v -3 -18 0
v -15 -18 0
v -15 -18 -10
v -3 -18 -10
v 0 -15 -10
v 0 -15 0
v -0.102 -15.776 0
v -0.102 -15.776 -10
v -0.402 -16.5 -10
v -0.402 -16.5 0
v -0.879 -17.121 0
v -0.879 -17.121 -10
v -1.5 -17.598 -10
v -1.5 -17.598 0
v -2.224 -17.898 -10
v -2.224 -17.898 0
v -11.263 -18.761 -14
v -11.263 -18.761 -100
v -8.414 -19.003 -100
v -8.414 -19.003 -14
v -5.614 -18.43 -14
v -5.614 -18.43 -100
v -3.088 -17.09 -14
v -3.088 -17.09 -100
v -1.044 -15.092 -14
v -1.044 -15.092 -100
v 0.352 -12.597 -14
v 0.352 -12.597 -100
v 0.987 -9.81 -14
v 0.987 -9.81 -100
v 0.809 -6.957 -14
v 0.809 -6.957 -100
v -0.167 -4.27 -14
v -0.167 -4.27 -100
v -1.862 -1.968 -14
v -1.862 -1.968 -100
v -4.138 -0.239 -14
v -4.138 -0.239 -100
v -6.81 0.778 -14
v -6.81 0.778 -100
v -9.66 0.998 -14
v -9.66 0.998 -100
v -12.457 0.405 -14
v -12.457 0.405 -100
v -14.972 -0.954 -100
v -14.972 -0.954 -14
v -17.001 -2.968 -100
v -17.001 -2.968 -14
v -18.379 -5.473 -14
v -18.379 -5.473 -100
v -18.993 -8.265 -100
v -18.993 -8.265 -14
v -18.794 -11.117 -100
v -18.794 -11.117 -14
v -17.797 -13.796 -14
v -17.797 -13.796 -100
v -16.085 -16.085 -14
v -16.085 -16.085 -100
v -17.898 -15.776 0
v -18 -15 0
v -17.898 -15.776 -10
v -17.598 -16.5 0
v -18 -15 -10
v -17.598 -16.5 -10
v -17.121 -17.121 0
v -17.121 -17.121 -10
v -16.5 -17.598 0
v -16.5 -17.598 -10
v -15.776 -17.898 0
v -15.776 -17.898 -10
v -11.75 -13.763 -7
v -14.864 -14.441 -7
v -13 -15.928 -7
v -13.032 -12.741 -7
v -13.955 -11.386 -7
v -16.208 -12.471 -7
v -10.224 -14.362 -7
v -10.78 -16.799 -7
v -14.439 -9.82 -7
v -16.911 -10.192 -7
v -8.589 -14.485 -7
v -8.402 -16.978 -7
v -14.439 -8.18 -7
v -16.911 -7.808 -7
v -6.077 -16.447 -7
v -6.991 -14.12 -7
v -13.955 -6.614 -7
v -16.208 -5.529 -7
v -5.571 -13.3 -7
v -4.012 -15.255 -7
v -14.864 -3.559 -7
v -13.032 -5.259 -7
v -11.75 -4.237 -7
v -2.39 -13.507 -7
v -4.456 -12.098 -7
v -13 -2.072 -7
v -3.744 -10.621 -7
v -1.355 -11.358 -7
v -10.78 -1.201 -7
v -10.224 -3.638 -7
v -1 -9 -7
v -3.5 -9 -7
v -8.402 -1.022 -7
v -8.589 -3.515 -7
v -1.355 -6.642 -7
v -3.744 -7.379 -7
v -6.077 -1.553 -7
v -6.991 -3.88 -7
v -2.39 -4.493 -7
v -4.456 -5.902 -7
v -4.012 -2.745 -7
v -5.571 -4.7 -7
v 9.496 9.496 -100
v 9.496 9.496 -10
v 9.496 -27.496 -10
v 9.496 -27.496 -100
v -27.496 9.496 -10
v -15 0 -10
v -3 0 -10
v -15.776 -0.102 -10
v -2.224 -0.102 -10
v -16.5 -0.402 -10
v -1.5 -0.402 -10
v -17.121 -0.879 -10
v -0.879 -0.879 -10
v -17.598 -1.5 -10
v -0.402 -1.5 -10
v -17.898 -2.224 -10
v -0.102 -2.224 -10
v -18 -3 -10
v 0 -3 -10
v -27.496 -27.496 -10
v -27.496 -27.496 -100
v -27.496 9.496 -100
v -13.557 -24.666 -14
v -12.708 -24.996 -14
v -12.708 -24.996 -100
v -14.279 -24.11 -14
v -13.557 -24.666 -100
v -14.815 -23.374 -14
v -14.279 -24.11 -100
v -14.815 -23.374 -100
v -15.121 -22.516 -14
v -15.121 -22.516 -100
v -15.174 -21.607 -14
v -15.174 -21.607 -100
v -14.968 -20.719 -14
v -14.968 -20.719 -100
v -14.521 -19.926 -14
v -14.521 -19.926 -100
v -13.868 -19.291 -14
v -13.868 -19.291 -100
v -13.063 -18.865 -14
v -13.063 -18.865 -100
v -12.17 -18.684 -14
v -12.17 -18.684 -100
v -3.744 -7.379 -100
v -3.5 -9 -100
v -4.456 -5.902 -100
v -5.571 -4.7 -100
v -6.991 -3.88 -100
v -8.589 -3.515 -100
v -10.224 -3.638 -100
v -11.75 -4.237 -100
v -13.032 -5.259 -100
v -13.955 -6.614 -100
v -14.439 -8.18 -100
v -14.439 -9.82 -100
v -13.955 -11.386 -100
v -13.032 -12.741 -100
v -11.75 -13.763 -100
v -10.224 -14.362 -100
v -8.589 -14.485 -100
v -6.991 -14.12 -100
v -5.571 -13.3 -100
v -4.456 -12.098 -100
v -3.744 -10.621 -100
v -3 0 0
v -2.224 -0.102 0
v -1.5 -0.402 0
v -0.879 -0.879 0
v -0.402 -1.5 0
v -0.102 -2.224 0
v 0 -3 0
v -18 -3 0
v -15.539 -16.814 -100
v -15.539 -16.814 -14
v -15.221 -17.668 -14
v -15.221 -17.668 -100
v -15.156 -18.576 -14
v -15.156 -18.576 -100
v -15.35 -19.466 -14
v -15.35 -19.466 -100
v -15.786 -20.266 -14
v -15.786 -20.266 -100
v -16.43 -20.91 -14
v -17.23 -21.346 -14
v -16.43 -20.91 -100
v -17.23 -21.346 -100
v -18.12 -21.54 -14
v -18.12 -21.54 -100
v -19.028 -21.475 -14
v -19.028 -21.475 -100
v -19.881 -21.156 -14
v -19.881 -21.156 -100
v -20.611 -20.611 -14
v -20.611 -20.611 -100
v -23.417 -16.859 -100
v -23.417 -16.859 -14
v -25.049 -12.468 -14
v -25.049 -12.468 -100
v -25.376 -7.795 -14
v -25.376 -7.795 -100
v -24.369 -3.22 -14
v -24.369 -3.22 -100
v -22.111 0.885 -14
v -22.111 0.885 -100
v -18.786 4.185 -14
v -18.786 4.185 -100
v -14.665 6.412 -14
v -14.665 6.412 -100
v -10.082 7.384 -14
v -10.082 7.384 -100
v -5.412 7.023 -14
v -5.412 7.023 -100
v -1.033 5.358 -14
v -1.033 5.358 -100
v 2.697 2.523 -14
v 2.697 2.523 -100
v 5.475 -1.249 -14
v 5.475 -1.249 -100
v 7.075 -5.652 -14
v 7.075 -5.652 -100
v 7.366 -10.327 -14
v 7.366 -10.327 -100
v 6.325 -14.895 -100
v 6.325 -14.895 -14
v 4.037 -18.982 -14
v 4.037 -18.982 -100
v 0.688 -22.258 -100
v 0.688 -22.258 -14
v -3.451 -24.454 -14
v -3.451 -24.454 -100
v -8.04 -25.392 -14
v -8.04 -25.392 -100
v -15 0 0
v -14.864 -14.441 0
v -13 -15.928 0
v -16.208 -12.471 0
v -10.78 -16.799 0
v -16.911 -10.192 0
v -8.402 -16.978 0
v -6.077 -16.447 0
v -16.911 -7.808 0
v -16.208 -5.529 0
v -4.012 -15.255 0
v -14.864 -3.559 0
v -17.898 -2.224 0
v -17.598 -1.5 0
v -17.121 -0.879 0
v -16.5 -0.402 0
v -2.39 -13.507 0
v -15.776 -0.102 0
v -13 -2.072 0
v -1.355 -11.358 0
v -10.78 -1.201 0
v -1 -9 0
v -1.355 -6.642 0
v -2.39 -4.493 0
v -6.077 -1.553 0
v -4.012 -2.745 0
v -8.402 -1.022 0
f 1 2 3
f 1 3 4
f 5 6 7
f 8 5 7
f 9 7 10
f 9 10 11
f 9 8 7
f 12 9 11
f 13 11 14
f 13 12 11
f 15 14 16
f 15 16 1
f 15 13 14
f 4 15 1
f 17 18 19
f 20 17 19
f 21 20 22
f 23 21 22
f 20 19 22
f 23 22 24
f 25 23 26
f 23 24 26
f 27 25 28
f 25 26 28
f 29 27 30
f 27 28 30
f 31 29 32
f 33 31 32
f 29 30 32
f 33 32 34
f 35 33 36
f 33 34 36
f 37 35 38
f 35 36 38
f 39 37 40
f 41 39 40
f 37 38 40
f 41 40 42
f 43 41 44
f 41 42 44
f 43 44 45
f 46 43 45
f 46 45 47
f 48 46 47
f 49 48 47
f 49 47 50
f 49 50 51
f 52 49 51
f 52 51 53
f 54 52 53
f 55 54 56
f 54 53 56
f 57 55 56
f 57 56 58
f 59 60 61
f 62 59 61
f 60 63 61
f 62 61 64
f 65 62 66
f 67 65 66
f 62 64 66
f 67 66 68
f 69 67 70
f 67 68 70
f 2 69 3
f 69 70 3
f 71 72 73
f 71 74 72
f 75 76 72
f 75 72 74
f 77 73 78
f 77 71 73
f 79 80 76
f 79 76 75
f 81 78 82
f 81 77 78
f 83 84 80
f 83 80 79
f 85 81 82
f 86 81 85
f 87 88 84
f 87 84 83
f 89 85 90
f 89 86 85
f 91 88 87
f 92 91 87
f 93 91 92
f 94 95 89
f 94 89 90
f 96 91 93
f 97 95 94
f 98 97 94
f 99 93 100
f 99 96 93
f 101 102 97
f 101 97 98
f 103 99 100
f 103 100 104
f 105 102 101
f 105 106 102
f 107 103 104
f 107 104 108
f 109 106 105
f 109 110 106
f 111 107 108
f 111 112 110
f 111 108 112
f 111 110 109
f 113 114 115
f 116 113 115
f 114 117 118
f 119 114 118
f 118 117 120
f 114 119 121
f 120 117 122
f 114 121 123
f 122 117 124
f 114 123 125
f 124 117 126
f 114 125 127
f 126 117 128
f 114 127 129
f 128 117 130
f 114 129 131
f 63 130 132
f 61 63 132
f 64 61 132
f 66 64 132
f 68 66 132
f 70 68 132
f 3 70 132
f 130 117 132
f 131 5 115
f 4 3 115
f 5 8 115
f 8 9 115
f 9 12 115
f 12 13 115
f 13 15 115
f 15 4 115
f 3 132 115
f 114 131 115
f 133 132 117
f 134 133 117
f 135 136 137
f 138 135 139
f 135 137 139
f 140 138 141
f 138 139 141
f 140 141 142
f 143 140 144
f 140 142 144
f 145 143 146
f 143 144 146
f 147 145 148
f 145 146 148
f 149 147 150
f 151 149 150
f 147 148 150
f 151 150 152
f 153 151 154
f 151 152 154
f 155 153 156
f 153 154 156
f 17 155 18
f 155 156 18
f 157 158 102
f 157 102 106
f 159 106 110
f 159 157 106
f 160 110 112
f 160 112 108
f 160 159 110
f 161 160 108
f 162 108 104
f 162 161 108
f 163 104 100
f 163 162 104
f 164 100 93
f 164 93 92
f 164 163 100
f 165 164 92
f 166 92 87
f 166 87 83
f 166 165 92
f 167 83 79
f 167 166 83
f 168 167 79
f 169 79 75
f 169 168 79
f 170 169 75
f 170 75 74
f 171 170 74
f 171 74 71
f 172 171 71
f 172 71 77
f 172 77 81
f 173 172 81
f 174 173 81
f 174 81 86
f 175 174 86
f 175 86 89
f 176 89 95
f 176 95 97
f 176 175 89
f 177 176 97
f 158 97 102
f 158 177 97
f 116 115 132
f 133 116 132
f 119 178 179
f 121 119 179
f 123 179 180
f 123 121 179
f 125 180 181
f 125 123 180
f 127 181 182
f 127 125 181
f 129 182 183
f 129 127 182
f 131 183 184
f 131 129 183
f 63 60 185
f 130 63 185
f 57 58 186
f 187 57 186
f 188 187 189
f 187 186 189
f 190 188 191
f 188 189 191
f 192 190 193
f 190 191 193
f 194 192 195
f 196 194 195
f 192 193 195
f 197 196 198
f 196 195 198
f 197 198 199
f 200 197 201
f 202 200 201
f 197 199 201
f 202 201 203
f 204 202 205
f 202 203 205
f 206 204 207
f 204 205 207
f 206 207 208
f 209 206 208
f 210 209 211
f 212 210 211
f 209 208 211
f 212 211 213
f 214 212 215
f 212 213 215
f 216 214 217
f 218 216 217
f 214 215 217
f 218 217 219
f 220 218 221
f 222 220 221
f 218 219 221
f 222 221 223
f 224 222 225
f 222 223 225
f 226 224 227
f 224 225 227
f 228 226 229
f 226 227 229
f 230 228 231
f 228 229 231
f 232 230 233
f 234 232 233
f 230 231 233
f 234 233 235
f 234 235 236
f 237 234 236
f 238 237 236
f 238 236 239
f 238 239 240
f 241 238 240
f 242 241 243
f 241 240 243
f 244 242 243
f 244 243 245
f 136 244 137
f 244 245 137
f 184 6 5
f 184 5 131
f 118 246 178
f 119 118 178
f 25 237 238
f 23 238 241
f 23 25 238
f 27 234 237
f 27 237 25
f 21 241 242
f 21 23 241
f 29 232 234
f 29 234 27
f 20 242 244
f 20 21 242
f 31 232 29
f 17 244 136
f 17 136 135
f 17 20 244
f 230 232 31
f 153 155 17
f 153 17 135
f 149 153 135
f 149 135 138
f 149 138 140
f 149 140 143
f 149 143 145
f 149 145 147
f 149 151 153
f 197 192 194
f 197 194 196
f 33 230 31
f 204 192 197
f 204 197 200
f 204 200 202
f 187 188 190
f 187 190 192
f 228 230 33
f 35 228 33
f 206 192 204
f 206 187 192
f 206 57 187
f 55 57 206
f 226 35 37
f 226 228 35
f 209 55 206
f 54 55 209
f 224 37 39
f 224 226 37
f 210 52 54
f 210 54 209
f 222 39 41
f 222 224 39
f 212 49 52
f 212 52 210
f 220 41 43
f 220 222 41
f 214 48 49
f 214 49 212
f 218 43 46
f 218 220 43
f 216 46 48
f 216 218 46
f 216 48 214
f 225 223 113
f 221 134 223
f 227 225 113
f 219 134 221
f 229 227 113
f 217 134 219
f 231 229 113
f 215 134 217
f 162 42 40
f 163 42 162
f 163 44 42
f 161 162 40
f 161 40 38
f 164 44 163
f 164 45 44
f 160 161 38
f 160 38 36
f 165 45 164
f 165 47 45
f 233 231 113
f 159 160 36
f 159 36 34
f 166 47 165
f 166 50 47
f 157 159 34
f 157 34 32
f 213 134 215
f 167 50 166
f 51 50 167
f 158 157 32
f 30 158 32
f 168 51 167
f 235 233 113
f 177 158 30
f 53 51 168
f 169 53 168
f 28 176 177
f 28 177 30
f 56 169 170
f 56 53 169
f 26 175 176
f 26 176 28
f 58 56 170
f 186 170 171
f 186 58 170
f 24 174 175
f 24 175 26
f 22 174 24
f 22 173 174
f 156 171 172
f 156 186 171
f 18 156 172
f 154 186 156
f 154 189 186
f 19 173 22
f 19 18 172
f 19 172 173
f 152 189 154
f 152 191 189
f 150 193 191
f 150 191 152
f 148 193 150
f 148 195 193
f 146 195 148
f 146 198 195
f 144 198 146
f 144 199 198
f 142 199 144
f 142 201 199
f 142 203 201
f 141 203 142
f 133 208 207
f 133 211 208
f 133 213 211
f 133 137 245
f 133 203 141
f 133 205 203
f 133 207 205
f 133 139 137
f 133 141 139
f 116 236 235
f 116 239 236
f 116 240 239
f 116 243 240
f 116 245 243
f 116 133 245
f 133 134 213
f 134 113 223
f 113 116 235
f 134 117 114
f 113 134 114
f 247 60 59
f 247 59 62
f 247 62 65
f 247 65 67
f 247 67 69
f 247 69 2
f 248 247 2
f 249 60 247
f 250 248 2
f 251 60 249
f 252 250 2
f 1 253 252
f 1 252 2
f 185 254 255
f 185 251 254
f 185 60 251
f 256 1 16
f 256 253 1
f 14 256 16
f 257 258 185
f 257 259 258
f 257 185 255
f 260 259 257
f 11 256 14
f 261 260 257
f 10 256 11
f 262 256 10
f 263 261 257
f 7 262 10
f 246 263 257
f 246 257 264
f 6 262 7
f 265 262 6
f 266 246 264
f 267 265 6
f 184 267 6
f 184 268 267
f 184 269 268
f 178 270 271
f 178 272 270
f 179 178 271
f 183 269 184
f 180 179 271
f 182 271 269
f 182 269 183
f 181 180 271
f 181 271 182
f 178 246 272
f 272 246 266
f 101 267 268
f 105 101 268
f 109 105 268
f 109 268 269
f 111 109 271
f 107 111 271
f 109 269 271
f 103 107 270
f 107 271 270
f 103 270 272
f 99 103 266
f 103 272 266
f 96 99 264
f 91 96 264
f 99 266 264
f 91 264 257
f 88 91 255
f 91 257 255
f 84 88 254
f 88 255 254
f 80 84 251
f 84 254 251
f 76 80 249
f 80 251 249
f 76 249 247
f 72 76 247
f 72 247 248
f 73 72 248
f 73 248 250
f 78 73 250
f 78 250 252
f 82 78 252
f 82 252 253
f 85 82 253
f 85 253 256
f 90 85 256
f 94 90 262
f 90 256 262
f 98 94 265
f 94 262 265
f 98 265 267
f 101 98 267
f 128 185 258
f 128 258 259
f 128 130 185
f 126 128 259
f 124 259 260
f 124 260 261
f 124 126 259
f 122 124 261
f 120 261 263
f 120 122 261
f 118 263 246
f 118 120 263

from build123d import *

# Parameters (mm, degrees)
SKETCH_1_W              = 18
SKETCH_1_H              = 18
EXTRUDE_2_DEPTH         = 10
EXTRUDE_3_DEPTH         = 90
CUT_EXTRUDE_3_DEPTH     = 86
CUT_EXTRUDE_START       = -100
CUT_EXTRUDE_5_OUTLINE_R = 5.5
CUT_EXTRUDE_5_DEPTH     = 93
SKETCH_7_R              = 8
CUT_EXTRUDE_6_DEPTH     = 7
FILLET_6_R              = 3
FILLET_7_R              = 3
FILLET_8_R              = 3
FILLET_9_R              = 3


# Read off the part's stored shape, not the designer's step: 切除-拉伸5
with BuildPart() as part:
    # 草图1 → 凸台-拉伸2 (new body)
    with BuildSketch(Plane.XY):
        with Locations((-9, -9)):
            Rectangle(SKETCH_1_W, SKETCH_1_H)
    extrude(amount=-EXTRUDE_2_DEPTH)

    # Sketch 3D_1 → 凸台-拉伸3 (add)
    with BuildSketch(Plane(origin=(9.495592889, -27.495592889, -10), x_dir=(-0.7071067811865476, 0.7071067811865476, -9.817405728081993e-13), z_dir=(-1.3883908327972863e-12, 0, 1.0))):
        Polygon((0, 0), (26.156718308, 26.156718308), (52.313436617, 0), (26.156718308, -26.156718308), align=None)
    extrude(amount=-EXTRUDE_3_DEPTH)

    # 草图6 → 切除-拉伸3 (cut)
    with BuildSketch(Plane(origin=(0, 0, -100), x_dir=(-1.0, 0, -1.3537169902663766e-12), z_dir=(1.3537169902663766e-12, -3.467772761410138e-14, -1.0))):
        with BuildLine():
            ThreePointArc((20.610593598, -20.610593598), (1.033022784, 5.357543015), (12.708084345, -24.995683102))
            ThreePointArc((12.708084345, -24.995683102), (15.102764846, -21.155695433), (11.262777177, -18.761014932))
            ThreePointArc((11.262777177, -18.761014932), (4.138326818, -0.238624142), (16.085110199, -16.085110199))
            ThreePointArc((16.085110199, -16.085110199), (16.085110199, -20.610593598), (20.610593598, -20.610593598))
        make_face()
    extrude(amount=-CUT_EXTRUDE_3_DEPTH, mode=Mode.SUBTRACT)

    # 切除-拉伸5 outline → 切除-拉伸5 (cut)
    with BuildSketch(Plane.XY.offset(CUT_EXTRUDE_START)):
        with Locations((-9, -9)):
            Circle(CUT_EXTRUDE_5_OUTLINE_R)
    extrude(amount=CUT_EXTRUDE_5_DEPTH, mode=Mode.SUBTRACT)

    # 草图7 → 切除-拉伸6 (cut)
    with BuildSketch(Plane.XY):
        with Locations((-9, -9)):
            Circle(SKETCH_7_R)
    extrude(amount=-CUT_EXTRUDE_6_DEPTH, mode=Mode.SUBTRACT)

    # 圆角6
    fillet_6_edges = [part.edges().sort_by_distance(p)[0] for p in [
        (-18, 0, -5),
    ]]
    fillet(fillet_6_edges, radius=FILLET_6_R)

    # 圆角7
    fillet_7_edges = [part.edges().sort_by_distance(p)[0] for p in [
        (-18, -18, -5),
    ]]
    fillet(fillet_7_edges, radius=FILLET_7_R)

    # 圆角8
    fillet_8_edges = [part.edges().sort_by_distance(p)[0] for p in [
        (0, 0, -5),
    ]]
    fillet(fillet_8_edges, radius=FILLET_8_R)

    # 圆角9
    fillet_9_edges = [part.edges().sort_by_distance(p)[0] for p in [
        (0, -18, -5),
    ]]
    fillet(fillet_9_edges, radius=FILLET_9_R)


solid = part.part
